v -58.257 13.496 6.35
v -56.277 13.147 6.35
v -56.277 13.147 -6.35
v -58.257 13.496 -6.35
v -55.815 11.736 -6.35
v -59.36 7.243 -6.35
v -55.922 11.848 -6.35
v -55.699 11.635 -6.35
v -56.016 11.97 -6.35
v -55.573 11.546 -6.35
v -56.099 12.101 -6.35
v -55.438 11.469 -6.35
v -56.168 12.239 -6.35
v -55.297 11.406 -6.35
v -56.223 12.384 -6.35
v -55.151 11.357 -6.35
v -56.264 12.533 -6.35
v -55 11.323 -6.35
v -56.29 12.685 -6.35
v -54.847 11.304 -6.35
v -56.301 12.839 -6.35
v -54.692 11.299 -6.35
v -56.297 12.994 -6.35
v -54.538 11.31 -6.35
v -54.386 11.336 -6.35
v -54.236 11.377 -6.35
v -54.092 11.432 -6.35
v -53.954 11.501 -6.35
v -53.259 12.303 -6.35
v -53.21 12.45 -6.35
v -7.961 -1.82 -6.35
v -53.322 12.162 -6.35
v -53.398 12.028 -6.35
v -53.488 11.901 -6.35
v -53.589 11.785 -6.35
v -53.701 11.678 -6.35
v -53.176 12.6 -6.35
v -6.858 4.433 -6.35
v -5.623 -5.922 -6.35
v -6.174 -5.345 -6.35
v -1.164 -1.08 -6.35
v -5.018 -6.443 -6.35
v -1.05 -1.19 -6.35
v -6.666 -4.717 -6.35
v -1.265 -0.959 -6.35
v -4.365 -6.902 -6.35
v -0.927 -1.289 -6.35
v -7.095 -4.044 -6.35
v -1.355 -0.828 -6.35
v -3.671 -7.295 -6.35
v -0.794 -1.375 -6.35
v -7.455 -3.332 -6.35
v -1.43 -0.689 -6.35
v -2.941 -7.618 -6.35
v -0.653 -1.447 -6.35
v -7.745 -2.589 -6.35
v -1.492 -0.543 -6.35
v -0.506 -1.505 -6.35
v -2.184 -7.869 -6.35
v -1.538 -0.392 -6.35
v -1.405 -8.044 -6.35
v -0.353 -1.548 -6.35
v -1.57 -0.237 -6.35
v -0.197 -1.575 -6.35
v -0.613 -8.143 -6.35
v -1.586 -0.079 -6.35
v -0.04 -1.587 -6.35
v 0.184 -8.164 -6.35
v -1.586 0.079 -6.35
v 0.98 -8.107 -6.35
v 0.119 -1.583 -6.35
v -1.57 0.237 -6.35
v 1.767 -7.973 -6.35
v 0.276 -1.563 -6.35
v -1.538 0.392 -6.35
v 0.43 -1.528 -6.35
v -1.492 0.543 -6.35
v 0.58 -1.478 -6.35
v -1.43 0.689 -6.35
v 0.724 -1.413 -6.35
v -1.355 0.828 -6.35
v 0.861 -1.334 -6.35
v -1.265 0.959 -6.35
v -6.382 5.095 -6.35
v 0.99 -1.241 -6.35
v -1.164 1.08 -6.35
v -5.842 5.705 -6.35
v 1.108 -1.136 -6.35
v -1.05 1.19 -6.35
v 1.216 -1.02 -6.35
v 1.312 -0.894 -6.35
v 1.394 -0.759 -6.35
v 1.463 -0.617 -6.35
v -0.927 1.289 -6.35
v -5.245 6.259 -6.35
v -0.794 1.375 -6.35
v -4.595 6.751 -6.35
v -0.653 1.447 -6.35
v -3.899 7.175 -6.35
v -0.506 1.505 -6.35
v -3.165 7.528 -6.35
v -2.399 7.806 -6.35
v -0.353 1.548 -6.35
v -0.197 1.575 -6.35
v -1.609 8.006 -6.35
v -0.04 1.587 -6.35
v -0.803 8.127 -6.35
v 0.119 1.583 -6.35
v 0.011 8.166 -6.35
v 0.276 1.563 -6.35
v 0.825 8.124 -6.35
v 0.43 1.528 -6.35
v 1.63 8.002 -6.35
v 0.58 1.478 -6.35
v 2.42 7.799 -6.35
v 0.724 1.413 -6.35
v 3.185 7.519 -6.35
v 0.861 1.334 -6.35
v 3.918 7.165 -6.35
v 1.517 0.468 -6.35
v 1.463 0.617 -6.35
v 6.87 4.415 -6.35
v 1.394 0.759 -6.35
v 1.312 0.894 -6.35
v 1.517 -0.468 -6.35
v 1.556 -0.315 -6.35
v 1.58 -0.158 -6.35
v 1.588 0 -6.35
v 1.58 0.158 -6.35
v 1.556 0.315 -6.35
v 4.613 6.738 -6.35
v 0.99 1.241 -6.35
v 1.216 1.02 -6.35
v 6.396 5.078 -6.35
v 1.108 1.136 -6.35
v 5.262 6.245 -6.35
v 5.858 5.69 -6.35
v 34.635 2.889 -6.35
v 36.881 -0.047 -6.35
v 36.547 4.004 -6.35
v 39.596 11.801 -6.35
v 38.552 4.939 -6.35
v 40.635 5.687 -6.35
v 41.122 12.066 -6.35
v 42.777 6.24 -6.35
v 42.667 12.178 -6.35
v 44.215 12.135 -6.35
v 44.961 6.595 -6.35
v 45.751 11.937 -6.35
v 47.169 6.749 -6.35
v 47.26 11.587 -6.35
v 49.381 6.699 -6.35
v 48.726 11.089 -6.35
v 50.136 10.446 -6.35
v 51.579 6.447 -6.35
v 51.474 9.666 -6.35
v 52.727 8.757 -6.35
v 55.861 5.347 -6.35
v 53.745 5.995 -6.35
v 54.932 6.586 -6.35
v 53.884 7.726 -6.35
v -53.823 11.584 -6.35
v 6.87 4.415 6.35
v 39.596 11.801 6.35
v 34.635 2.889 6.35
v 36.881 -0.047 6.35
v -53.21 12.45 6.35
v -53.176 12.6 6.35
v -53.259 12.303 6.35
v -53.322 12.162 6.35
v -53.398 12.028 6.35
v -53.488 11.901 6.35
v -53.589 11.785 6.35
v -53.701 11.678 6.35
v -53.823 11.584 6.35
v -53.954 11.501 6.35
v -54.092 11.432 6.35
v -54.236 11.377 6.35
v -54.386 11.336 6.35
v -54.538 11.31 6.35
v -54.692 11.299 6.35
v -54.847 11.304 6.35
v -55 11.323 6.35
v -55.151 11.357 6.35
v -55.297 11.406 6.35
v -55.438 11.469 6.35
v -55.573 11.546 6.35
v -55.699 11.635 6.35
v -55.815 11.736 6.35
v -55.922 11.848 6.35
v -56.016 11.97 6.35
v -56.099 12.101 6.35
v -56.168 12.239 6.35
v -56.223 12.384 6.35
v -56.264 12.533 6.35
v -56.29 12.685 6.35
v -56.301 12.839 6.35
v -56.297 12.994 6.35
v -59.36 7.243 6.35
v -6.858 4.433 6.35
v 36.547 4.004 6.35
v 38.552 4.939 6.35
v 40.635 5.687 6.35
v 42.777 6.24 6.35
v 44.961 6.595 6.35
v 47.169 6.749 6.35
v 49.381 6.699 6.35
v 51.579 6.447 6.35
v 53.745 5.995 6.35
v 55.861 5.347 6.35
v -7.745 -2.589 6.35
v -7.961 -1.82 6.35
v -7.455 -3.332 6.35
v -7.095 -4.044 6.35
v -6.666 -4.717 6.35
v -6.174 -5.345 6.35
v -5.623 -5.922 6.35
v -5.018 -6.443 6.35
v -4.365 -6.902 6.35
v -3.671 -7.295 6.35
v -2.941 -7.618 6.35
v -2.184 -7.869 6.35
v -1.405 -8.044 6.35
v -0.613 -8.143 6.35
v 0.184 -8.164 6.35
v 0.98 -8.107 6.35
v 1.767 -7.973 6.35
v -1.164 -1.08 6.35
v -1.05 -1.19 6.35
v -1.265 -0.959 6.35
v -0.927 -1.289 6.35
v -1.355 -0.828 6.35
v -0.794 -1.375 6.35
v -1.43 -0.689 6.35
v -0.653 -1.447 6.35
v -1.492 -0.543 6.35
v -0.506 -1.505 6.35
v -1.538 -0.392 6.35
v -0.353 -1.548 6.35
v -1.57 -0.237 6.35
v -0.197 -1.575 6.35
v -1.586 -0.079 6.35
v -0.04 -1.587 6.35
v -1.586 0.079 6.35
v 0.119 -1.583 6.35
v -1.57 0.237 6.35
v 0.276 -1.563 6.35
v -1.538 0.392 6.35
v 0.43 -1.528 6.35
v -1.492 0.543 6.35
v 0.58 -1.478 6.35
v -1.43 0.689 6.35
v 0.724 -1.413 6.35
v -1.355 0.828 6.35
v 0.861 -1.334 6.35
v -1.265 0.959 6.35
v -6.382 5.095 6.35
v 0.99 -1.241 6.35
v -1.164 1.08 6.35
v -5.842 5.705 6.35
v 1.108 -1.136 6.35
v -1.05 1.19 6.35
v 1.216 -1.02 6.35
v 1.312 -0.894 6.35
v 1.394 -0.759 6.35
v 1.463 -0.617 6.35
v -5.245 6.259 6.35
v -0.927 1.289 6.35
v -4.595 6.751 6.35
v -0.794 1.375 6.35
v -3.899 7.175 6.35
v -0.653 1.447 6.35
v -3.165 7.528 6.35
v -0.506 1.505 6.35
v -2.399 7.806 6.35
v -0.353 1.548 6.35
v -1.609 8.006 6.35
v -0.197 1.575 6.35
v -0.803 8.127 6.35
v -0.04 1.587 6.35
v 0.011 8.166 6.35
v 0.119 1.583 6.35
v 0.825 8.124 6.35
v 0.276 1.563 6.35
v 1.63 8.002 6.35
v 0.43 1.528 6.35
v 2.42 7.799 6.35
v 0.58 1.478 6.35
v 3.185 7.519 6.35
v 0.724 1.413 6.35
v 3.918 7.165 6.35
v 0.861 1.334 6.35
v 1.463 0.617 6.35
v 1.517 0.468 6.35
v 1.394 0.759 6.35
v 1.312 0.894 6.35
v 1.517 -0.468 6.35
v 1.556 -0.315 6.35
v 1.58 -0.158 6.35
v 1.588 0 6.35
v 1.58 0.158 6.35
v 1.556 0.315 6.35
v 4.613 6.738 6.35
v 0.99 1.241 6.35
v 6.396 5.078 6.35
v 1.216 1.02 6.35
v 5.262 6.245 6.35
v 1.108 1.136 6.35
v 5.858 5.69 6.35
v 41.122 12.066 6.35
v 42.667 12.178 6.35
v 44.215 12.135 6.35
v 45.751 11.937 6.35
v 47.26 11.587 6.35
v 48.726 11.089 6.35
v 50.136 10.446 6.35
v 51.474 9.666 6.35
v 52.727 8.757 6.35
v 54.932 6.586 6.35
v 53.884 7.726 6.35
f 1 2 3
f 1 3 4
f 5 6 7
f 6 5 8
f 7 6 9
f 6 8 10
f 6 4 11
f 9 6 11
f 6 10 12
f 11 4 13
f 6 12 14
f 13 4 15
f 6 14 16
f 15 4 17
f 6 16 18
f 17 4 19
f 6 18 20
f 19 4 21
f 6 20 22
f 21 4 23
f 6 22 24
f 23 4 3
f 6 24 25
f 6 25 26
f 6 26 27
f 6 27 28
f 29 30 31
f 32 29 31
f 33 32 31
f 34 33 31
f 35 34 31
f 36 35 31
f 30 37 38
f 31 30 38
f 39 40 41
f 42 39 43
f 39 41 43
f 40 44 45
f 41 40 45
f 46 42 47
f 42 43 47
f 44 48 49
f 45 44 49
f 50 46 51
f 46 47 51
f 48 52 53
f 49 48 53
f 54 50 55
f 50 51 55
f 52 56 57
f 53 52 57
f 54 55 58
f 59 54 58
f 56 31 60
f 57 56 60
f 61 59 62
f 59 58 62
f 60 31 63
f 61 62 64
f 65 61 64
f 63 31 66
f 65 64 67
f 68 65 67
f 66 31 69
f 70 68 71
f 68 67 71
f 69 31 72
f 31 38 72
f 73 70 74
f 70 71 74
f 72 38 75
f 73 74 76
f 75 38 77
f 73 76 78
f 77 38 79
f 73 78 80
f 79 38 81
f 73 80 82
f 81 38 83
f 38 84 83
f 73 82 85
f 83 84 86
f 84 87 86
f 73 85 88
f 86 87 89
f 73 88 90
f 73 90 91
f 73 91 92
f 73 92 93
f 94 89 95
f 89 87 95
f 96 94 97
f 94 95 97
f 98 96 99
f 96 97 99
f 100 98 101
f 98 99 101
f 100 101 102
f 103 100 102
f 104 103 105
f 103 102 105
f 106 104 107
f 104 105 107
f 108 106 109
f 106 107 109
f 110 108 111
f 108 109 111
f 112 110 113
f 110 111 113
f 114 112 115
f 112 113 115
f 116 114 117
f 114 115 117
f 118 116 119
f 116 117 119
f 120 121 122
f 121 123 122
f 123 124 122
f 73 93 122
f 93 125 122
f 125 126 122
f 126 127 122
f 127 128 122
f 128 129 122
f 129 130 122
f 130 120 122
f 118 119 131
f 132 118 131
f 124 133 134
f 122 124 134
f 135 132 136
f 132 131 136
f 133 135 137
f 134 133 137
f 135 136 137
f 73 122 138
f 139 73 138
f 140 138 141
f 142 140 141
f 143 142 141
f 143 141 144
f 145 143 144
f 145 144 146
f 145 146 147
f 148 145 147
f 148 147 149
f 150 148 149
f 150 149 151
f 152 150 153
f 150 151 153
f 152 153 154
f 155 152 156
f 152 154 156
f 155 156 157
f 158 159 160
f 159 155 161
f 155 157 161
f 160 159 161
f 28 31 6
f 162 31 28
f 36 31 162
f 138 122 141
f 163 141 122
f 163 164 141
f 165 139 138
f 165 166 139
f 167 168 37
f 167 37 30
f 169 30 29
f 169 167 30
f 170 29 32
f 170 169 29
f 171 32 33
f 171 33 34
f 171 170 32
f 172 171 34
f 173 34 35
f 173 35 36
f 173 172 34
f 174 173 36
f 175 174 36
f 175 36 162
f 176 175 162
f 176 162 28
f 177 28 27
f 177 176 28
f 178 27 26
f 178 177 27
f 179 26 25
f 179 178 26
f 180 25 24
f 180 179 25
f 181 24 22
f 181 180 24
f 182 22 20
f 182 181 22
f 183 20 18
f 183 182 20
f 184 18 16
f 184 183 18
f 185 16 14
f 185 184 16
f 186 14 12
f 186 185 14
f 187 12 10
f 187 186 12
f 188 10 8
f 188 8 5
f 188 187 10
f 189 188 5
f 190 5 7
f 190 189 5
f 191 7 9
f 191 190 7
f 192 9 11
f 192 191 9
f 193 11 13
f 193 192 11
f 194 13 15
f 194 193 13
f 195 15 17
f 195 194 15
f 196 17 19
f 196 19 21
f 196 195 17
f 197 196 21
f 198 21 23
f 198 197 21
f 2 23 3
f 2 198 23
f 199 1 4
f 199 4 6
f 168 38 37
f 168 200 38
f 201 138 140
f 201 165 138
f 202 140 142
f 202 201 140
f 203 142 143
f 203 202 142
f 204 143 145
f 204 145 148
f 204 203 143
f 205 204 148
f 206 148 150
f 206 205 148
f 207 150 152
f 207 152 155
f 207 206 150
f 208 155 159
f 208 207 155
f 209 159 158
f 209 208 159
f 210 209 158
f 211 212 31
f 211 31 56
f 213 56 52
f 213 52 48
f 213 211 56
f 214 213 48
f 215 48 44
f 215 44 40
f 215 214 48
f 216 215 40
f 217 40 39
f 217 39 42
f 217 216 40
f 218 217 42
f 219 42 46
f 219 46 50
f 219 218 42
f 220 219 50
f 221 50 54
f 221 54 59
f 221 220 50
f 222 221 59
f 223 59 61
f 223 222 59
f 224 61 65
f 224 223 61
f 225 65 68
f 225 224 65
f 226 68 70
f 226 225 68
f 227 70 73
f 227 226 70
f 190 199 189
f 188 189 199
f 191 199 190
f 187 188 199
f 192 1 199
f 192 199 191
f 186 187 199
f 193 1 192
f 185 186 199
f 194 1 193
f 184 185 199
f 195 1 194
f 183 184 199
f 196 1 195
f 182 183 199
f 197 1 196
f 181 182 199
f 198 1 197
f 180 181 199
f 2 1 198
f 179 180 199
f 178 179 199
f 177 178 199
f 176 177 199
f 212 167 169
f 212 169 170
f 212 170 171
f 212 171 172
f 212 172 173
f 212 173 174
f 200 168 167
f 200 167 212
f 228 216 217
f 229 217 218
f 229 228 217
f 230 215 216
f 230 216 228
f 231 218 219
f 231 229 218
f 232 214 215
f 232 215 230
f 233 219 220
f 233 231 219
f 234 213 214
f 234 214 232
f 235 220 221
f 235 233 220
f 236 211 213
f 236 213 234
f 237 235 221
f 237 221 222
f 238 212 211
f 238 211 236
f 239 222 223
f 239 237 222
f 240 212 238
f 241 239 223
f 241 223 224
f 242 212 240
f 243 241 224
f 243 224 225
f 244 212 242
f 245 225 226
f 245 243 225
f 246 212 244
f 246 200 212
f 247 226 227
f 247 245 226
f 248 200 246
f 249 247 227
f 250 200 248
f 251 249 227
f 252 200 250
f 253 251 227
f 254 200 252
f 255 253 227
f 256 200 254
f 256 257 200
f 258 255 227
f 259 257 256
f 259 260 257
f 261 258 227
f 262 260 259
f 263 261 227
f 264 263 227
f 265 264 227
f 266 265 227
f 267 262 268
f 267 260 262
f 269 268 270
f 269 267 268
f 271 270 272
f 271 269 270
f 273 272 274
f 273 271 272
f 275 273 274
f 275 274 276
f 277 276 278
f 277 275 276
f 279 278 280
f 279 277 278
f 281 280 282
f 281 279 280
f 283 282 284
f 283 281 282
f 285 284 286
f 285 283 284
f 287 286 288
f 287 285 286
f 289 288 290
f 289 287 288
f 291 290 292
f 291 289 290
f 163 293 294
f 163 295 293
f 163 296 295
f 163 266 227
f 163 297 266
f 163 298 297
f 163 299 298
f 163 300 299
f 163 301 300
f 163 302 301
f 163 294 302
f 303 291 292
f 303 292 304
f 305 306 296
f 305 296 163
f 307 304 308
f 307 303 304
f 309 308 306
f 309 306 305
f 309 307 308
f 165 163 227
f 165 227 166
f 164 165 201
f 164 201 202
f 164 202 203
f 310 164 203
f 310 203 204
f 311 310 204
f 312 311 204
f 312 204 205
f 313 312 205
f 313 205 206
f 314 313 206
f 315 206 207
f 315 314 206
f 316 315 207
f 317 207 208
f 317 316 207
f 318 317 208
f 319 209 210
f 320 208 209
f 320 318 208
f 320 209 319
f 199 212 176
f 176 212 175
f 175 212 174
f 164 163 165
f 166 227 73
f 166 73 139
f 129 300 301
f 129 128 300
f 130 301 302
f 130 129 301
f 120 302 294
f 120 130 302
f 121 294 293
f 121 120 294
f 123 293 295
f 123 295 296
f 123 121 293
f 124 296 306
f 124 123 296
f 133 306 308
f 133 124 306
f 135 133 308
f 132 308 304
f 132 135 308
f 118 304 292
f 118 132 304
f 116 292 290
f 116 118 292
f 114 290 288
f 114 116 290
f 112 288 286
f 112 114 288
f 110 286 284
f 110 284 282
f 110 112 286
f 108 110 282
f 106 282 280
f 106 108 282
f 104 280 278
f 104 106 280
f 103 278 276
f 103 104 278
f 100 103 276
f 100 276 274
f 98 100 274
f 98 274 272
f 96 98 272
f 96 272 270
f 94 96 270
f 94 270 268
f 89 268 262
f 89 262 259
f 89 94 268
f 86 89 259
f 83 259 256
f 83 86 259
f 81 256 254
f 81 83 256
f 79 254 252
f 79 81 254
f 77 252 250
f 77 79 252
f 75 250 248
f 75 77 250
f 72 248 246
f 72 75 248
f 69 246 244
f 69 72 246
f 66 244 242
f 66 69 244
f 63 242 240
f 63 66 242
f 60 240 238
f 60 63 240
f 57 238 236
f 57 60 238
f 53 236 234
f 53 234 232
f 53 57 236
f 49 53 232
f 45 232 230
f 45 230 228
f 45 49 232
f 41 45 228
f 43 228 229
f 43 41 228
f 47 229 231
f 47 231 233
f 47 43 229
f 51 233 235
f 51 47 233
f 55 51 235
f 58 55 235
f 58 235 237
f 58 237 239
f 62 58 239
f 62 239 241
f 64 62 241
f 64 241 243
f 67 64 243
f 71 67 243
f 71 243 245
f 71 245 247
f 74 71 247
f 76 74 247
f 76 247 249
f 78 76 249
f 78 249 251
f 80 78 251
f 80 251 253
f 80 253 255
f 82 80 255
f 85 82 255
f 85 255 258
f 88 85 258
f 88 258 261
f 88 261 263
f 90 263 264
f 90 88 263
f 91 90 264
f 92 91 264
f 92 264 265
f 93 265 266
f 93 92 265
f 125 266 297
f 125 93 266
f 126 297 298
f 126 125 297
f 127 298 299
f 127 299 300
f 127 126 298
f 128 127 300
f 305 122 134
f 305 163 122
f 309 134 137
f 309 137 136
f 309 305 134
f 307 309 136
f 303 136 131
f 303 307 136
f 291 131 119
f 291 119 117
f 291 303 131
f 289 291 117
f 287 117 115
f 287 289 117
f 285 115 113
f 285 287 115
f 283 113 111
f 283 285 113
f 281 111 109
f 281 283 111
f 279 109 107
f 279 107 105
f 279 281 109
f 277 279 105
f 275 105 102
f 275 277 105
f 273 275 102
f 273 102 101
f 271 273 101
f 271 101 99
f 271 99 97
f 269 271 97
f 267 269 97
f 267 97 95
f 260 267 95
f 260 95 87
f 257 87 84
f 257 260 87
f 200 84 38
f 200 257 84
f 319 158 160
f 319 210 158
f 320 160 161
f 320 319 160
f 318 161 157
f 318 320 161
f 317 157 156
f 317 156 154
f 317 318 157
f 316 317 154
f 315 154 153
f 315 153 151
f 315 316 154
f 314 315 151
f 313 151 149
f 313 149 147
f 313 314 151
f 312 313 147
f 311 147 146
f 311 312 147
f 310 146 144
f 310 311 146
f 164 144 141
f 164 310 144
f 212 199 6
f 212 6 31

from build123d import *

# Parameters (mm, degrees)
SKETCH1_R           = 1.5875
BOSS_EXTRUDE1_DEPTH = 6.35


with BuildPart() as part:
    # Sketch1 → Boss-Extrude1 (new, symmetric)
    with BuildSketch(Plane.XY):
        with BuildLine():
            Line((-6.857967121, 4.433224129), (-53.175519737, 12.600258336))
            ThreePointArc((-53.175519737, 12.600258336), (-54.999856137, 11.322844236), (-56.277270236, 13.147180636))
            Line((-56.277270236, 13.147180636), (-58.257319182, 13.496316688))
            Line((-58.257319182, 13.496316688), (-59.35998511, 7.242787457))
            Line((-59.35998511, 7.242787457), (-7.960633049, -1.820305103))
            ThreePointArc((-7.960633049, -1.820305103), (-4.365043482, -6.901563925), (1.766856325, -7.9726663))
            Line((1.766856325, -7.9726663), (36.881050722, -0.047144418))
            Line((36.881050722, -0.047144418), (34.635185978, 2.889025961))
            ThreePointArc((34.635185978, 2.889025961), (44.961162175, 6.595254431), (55.860821822, 5.346521684))
            ThreePointArc((55.860821822, 5.346521684), (48.726273767, 11.088641723), (39.595789676, 11.801367988))
            Line((39.595789676, 11.801367988), (6.869791404, 4.414878852))
            ThreePointArc((6.869791404, 4.414878852), (0.010912869, 8.166092708), (-6.857967121, 4.433224129))
        make_face()
        Circle(SKETCH1_R, mode=Mode.SUBTRACT)
    extrude(amount=BOSS_EXTRUDE1_DEPTH, both=True)


solid = part.part
